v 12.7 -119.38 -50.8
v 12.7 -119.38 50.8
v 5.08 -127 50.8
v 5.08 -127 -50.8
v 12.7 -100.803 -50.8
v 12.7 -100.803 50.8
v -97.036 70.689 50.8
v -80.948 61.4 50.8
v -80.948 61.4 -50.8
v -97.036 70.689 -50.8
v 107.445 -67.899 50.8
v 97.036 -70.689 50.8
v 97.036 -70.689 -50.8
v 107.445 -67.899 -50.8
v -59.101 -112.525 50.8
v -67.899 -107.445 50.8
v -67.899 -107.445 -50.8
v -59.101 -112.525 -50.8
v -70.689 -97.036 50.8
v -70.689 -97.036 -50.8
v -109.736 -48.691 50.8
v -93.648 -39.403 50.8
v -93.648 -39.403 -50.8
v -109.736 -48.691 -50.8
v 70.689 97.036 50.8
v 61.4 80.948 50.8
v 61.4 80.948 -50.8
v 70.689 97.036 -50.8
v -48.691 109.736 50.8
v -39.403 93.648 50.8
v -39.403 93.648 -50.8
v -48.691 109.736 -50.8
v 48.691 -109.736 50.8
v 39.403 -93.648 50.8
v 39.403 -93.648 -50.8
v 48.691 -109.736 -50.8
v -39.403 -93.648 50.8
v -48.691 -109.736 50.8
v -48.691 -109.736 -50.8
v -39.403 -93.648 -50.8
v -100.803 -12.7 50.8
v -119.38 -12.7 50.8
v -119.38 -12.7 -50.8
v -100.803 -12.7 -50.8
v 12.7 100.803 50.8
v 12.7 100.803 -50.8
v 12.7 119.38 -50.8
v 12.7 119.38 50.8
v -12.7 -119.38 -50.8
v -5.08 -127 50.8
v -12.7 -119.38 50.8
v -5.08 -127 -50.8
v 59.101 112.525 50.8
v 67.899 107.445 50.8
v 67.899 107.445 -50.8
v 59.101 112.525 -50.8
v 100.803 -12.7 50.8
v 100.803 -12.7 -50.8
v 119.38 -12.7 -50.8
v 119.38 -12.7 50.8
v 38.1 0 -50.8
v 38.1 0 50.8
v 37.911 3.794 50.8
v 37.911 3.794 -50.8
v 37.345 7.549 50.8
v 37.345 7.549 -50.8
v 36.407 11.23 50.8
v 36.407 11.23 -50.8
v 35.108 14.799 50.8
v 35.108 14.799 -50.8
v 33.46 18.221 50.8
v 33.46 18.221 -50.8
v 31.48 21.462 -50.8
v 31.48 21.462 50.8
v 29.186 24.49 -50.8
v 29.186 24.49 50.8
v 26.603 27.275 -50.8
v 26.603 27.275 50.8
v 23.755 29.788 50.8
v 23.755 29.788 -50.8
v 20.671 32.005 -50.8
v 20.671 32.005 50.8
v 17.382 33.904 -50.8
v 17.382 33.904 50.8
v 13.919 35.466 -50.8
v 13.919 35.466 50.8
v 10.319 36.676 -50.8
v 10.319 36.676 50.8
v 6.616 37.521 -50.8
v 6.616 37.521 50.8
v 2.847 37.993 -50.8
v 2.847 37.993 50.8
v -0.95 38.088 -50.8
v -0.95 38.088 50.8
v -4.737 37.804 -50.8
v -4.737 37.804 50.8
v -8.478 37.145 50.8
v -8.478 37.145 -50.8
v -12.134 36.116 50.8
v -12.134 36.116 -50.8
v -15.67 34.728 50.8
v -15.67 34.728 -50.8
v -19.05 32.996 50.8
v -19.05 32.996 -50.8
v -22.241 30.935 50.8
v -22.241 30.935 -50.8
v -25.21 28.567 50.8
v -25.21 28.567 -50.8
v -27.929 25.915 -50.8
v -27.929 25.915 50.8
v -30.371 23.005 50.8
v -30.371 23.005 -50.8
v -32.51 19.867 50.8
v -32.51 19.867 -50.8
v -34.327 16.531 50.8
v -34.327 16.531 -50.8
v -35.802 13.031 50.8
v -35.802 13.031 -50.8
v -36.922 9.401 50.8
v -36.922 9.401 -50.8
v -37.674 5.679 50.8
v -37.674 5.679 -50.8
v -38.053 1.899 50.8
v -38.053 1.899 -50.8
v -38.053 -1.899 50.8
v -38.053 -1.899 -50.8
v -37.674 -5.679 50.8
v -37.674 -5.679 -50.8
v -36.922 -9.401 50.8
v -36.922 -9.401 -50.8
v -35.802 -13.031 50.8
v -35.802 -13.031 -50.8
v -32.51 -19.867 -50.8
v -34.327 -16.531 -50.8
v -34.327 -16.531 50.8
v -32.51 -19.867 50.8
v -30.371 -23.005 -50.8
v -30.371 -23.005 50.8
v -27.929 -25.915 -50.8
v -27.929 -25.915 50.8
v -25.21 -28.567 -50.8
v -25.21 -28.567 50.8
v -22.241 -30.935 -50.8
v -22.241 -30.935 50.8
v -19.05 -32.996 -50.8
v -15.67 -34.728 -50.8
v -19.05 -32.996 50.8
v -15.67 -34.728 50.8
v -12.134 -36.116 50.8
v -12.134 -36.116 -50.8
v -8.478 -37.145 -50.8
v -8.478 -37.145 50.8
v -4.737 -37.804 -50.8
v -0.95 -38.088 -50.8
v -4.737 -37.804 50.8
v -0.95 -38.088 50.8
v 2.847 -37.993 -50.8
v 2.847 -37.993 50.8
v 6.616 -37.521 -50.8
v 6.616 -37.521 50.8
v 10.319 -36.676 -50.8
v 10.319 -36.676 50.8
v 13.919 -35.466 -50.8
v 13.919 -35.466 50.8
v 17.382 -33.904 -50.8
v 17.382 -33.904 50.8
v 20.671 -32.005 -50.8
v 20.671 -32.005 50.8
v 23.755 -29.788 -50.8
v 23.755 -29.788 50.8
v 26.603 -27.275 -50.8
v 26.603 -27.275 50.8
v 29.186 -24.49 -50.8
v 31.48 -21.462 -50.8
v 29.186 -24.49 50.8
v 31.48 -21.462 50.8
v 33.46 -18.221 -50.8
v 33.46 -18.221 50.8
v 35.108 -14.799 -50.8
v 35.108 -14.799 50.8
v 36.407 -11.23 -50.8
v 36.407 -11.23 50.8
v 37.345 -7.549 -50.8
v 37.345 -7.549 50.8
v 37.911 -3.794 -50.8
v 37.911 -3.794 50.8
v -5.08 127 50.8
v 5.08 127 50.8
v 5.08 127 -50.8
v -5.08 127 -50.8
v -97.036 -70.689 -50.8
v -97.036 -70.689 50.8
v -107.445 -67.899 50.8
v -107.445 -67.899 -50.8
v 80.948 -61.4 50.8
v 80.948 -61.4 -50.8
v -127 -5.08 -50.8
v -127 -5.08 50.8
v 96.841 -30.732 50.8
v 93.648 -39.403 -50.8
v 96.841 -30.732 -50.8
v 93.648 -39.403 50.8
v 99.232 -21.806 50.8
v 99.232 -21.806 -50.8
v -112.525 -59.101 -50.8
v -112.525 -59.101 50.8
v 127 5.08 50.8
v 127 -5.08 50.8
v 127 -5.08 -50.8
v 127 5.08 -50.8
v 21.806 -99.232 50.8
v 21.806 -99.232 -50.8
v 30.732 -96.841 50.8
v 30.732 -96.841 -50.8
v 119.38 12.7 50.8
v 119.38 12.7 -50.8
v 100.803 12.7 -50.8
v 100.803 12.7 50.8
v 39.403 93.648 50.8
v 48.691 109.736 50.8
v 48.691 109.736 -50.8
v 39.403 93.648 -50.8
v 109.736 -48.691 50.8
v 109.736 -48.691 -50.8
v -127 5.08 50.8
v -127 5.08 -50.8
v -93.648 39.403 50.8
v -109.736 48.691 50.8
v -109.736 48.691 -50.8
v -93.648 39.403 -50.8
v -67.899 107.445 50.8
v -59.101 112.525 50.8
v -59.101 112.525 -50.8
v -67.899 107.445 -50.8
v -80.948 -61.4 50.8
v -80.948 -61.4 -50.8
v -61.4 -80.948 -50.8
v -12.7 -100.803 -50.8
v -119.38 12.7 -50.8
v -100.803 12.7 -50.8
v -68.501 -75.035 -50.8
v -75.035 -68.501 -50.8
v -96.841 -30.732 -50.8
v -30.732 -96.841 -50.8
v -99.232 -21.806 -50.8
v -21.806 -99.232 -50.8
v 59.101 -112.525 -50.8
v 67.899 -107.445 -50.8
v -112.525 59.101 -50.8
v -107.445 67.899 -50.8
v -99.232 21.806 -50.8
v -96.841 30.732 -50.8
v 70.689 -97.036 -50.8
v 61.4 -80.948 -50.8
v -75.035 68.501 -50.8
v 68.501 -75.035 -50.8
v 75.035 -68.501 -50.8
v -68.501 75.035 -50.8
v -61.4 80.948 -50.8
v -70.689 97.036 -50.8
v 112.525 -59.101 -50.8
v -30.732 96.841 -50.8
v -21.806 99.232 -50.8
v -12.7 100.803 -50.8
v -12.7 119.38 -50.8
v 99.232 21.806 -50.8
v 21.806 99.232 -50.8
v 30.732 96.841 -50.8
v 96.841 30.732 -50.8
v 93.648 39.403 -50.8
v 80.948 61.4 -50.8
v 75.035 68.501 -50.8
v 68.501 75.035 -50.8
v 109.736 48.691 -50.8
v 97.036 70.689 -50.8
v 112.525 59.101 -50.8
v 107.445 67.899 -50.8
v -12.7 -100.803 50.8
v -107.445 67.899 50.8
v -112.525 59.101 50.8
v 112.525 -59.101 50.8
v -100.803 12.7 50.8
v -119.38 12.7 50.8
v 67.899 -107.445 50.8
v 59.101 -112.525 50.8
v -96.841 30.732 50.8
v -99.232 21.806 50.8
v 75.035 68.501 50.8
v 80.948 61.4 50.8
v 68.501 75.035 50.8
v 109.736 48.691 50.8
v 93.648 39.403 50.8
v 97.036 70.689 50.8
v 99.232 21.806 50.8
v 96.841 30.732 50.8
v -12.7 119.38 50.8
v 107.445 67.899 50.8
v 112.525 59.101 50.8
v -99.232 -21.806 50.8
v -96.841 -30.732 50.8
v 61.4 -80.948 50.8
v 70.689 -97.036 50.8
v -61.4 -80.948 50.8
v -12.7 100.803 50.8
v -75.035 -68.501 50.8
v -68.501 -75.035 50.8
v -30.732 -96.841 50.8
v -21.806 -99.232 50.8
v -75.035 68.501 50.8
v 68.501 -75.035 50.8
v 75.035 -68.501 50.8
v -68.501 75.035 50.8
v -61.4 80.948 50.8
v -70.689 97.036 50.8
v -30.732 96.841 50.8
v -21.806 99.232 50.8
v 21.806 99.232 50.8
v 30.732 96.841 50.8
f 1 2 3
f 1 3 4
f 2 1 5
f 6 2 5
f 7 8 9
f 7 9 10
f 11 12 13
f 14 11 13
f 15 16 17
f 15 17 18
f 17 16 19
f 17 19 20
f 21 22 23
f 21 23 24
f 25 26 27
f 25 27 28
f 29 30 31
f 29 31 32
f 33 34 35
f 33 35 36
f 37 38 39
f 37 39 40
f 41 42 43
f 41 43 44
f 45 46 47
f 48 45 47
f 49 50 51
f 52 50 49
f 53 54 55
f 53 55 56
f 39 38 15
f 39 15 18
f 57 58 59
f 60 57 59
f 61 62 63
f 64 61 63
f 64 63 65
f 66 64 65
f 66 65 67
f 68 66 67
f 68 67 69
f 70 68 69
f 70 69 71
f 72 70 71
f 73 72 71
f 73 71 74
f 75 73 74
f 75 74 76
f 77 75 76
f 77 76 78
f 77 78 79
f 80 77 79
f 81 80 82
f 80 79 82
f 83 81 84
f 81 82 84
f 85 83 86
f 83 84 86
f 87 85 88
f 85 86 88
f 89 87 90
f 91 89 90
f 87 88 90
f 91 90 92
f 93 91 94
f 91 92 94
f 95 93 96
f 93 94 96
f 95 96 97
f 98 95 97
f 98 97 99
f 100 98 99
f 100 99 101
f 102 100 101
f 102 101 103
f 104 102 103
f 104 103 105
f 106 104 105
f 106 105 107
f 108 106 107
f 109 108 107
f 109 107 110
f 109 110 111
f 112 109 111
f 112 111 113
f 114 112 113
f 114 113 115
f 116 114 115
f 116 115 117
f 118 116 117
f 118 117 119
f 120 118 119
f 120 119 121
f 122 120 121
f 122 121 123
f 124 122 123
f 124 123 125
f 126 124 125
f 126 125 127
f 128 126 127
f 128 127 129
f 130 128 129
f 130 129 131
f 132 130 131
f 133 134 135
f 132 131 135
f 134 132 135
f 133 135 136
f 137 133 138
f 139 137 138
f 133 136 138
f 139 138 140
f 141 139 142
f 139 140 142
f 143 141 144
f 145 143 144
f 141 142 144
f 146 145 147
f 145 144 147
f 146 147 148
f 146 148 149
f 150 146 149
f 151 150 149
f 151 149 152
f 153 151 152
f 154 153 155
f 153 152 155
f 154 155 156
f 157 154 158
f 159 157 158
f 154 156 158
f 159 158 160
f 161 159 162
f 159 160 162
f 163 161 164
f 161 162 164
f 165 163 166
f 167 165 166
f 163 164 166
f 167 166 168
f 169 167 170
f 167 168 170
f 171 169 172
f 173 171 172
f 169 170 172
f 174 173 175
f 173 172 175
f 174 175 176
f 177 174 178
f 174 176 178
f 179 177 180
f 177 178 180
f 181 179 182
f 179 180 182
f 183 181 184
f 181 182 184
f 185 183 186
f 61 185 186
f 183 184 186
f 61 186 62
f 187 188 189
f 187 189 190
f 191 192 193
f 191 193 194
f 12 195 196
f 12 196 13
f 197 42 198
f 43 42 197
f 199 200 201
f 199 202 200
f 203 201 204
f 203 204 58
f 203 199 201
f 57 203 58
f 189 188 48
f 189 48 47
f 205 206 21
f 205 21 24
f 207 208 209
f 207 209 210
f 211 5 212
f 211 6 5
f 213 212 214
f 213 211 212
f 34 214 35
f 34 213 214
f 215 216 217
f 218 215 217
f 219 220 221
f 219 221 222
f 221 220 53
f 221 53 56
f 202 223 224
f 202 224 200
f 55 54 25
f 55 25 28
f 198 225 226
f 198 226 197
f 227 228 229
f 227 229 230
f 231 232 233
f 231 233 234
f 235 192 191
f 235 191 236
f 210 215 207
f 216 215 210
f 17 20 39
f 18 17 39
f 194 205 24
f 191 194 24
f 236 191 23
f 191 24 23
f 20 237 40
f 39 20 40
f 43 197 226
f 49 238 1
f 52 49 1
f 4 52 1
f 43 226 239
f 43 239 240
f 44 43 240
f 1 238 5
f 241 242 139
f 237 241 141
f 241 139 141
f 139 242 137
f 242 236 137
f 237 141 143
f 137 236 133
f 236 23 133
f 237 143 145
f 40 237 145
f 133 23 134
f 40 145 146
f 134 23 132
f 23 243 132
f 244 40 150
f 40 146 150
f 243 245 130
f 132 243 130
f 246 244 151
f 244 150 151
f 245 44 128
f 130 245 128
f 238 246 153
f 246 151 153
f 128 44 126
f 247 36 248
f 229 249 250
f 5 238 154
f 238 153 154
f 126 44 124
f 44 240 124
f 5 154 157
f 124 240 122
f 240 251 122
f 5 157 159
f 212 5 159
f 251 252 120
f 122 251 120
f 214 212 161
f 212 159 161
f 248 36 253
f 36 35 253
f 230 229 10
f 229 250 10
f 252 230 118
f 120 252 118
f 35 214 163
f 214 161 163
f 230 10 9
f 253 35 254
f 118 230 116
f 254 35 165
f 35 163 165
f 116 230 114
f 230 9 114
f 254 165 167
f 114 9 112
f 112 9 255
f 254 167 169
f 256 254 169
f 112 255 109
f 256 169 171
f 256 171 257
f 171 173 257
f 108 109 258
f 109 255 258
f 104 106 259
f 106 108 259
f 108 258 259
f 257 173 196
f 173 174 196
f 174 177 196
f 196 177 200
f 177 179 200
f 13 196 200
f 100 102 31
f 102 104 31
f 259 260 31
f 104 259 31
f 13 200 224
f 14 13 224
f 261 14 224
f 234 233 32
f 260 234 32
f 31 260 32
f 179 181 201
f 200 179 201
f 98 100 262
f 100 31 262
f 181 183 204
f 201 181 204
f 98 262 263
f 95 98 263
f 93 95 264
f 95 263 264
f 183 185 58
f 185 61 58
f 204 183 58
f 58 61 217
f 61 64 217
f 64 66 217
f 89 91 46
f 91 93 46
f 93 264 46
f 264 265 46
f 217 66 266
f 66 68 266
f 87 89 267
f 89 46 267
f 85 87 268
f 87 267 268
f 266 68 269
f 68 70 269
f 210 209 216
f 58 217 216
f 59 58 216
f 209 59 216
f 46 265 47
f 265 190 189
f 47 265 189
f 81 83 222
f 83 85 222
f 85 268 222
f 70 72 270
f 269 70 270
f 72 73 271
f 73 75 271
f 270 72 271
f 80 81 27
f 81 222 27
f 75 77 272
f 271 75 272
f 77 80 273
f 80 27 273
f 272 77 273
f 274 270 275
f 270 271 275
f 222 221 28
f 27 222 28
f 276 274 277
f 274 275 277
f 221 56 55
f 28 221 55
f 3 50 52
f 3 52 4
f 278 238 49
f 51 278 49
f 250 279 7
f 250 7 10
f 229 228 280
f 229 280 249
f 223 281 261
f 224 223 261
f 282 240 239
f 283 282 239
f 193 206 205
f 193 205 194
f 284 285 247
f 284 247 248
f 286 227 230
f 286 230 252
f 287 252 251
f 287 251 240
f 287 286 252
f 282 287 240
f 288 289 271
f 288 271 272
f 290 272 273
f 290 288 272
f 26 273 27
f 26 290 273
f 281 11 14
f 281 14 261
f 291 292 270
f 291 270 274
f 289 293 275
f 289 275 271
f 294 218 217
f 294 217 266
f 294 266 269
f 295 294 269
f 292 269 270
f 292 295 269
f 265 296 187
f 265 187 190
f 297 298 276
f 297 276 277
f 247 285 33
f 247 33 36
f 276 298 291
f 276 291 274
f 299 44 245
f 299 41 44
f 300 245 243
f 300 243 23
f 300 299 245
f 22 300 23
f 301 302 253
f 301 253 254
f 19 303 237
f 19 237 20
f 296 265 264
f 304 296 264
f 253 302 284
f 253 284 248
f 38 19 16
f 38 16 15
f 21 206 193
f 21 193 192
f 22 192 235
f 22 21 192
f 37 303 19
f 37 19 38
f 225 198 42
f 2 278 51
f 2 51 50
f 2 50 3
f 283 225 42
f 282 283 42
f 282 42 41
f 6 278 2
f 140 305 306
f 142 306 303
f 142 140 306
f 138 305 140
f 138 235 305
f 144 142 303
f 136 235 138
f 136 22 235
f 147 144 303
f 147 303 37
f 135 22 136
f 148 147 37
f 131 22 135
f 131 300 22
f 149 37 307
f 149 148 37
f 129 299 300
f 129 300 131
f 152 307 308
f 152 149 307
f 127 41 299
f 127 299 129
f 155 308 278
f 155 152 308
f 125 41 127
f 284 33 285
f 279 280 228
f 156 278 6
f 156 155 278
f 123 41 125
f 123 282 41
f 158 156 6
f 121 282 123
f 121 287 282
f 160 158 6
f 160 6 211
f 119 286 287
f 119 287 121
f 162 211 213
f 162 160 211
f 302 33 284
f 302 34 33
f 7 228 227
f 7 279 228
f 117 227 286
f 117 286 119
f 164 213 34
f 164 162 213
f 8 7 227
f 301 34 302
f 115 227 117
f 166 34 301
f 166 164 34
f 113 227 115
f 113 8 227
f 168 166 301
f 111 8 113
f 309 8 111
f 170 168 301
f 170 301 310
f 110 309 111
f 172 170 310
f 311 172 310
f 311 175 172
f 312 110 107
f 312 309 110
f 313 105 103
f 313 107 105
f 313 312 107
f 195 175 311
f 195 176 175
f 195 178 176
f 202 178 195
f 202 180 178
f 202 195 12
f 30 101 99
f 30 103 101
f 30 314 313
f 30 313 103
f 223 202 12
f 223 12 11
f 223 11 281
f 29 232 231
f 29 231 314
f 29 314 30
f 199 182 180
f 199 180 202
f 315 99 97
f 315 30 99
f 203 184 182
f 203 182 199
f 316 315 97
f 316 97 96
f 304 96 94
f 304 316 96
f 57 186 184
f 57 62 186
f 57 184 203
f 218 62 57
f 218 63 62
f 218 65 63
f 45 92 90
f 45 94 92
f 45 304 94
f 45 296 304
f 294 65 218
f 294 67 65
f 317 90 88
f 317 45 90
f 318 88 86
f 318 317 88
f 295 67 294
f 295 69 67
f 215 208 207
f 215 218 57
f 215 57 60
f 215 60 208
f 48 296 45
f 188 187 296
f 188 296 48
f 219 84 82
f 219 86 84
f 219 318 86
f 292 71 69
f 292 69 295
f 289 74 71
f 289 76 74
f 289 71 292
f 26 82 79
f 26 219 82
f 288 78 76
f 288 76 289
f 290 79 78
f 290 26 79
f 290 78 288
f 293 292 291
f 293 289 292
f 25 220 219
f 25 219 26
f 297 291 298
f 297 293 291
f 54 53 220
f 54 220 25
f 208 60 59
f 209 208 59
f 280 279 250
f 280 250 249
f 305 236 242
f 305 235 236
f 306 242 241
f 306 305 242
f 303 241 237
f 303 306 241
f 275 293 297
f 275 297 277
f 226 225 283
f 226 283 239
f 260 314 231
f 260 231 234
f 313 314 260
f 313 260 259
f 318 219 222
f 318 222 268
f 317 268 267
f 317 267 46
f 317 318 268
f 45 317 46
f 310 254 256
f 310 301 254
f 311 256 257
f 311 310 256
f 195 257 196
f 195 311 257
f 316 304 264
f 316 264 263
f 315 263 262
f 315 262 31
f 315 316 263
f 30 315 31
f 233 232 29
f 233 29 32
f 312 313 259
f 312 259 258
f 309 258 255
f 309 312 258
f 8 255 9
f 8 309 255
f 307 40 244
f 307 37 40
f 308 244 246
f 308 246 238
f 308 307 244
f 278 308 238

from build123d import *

# Parameters (mm, degrees)
SKETCH1_R           = 101.6
BOSS_EXTRUDE1_DEPTH = 50.8
BOSS_EXTRUDE2_DEPTH = 101.6
CHAMFER1_SIZE       = 7.62
SKETCH3_R           = 38.1
CUT_EXTRUDE1_DEPTH  = 102.6


with BuildPart() as part:
    # Sketch1 → Boss-Extrude1 (new body, symmetric)
    with BuildSketch(Plane.XY):
        Circle(SKETCH1_R)
    extrude(amount=BOSS_EXTRUDE1_DEPTH, both=True)

    # Sketch2 → Boss-Extrude2 (add, through all)
    with BuildSketch(Plane.XY.offset(50.8)):
        with BuildLine():
            Line((74.498522628, 103.635226281), (52.501477372, 116.335226281))
            Line((52.501477372, 116.335226281), (39.403039848, 93.648066989))
            ThreePointArc((39.403039848, 93.648066989), (50.8, 87.988181024), (61.400085104, 80.948066989))
            Line((61.400085104, 80.948066989), (74.498522628, 103.635226281))
        make_face()
        with BuildLine():
            Line((12.7, 100.803124952), (12.7, 127))
            Line((12.7, 127), (-12.7, 127))
            Line((-12.7, 127), (-12.7, 100.803124952))
            ThreePointArc((-12.7, 100.803124952), (0, 101.6), (12.7, 100.803124952))
        make_face()
        with BuildLine():
            Line((116.335226281, 52.501477372), (103.635226281, 74.498522628))
            Line((103.635226281, 74.498522628), (80.948066989, 61.400085104))
            ThreePointArc((80.948066989, 61.400085104), (87.988181024, 50.8), (93.648066989, 39.403039848))
            Line((93.648066989, 39.403039848), (116.335226281, 52.501477372))
        make_face()
        with BuildLine():
            Line((127, -12.7), (127, 12.7))
            Line((127, 12.7), (100.803124952, 12.7))
            ThreePointArc((100.803124952, 12.7), (101.6, 0), (100.803124952, -12.7))
            Line((100.803124952, -12.7), (127, -12.7))
        make_face()
        with BuildLine():
            Line((103.635226281, -74.498522628), (116.335226281, -52.501477372))
            Line((116.335226281, -52.501477372), (93.648066989, -39.403039848))
            ThreePointArc((93.648066989, -39.403039848), (87.988181024, -50.8), (80.948066989, -61.400085104))
            Line((80.948066989, -61.400085104), (103.635226281, -74.498522628))
        make_face()
        with BuildLine():
            Line((52.501477372, -116.335226281), (74.498522628, -103.635226281))
            Line((74.498522628, -103.635226281), (61.400085104, -80.948066989))
            ThreePointArc((61.400085104, -80.948066989), (50.8, -87.988181024), (39.403039848, -93.648066989))
            Line((39.403039848, -93.648066989), (52.501477372, -116.335226281))
        make_face()
        with BuildLine():
            Line((-12.7, -127), (12.7, -127))
            Line((12.7, -127), (12.7, -100.803124952))
            ThreePointArc((12.7, -100.803124952), (0, -101.6), (-12.7, -100.803124952))
            Line((-12.7, -100.803124952), (-12.7, -127))
        make_face()
        with BuildLine():
            Line((-74.498522628, -103.635226281), (-52.501477372, -116.335226281))
            Line((-52.501477372, -116.335226281), (-39.403039848, -93.648066989))
            ThreePointArc((-39.403039848, -93.648066989), (-50.8, -87.988181024), (-61.400085104, -80.948066989))
            Line((-61.400085104, -80.948066989), (-74.498522628, -103.635226281))
        make_face()
        with BuildLine():
            Line((-116.335226281, -52.501477372), (-103.635226281, -74.498522628))
            Line((-103.635226281, -74.498522628), (-80.948066989, -61.400085104))
            ThreePointArc((-80.948066989, -61.400085104), (-87.988181024, -50.8), (-93.648066989, -39.403039848))
            Line((-93.648066989, -39.403039848), (-116.335226281, -52.501477372))
        make_face()
        with BuildLine():
            Line((-127, 12.7), (-127, -12.7))
            Line((-127, -12.7), (-100.803124952, -12.7))
            ThreePointArc((-100.803124952, -12.7), (-101.6, 0), (-100.803124952, 12.7))
            Line((-100.803124952, 12.7), (-127, 12.7))
        make_face()
        with BuildLine():
            Line((-103.635226281, 74.498522628), (-116.335226281, 52.501477372))
            Line((-116.335226281, 52.501477372), (-93.648066989, 39.403039848))
            ThreePointArc((-93.648066989, 39.403039848), (-87.988181024, 50.8), (-80.948066989, 61.400085104))
            Line((-80.948066989, 61.400085104), (-103.635226281, 74.498522628))
        make_face()
        with BuildLine():
            Line((-52.501477372, 116.335226281), (-74.498522628, 103.635226281))
            Line((-74.498522628, 103.635226281), (-61.400085104, 80.948066989))
            ThreePointArc((-61.400085104, 80.948066989), (-50.8, 87.988181024), (-39.403039848, 93.648066989))
            Line((-39.403039848, 93.648066989), (-52.501477372, 116.335226281))
        make_face()
    extrude(amount=-BOSS_EXTRUDE2_DEPTH)

    # Chamfer1
    chamfer1_edges = [part.edges().sort_by_distance(p)[0] for p in [
        (-127, -12.7, 0),
        (-127, 12.7, 0),
        (-116.335226281, 52.501477372, 0),
        (-103.635226281, 74.498522628, 0),
        (-74.498522628, 103.635226281, 0),
        (-52.501477372, 116.335226281, 0),
        (52.501477372, 116.335226281, 0),
        (74.498522628, 103.635226281, 0),
        (103.635226281, 74.498522628, 0),
        (116.335226281, 52.501477372, 0),
        (127, 12.7, 0),
        (127, -12.7, 0),
        (116.335226281, -52.501477372, 0),
        (103.635226281, -74.498522628, 0),
        (74.498522628, -103.635226281, 0),
        (52.501477372, -116.335226281, 0),
        (12.7, -127, 0),
        (-12.7, -127, 0),
        (-12.7, 127, 0),
        (12.7, 127, 0),
        (-52.501477372, -116.335226281, 0),
        (-74.498522628, -103.635226281, 0),
        (-103.635226281, -74.498522628, 0),
        (-116.335226281, -52.501477372, 0),
    ]]
    chamfer(chamfer1_edges, length=CHAMFER1_SIZE)

    # Sketch3 → Cut-Extrude1 (cut, through all)
    with BuildSketch(Plane.XY.offset(50.8)):
        Circle(SKETCH3_R)
    extrude(amount=-CUT_EXTRUDE1_DEPTH, mode=Mode.SUBTRACT)


solid = part.part
